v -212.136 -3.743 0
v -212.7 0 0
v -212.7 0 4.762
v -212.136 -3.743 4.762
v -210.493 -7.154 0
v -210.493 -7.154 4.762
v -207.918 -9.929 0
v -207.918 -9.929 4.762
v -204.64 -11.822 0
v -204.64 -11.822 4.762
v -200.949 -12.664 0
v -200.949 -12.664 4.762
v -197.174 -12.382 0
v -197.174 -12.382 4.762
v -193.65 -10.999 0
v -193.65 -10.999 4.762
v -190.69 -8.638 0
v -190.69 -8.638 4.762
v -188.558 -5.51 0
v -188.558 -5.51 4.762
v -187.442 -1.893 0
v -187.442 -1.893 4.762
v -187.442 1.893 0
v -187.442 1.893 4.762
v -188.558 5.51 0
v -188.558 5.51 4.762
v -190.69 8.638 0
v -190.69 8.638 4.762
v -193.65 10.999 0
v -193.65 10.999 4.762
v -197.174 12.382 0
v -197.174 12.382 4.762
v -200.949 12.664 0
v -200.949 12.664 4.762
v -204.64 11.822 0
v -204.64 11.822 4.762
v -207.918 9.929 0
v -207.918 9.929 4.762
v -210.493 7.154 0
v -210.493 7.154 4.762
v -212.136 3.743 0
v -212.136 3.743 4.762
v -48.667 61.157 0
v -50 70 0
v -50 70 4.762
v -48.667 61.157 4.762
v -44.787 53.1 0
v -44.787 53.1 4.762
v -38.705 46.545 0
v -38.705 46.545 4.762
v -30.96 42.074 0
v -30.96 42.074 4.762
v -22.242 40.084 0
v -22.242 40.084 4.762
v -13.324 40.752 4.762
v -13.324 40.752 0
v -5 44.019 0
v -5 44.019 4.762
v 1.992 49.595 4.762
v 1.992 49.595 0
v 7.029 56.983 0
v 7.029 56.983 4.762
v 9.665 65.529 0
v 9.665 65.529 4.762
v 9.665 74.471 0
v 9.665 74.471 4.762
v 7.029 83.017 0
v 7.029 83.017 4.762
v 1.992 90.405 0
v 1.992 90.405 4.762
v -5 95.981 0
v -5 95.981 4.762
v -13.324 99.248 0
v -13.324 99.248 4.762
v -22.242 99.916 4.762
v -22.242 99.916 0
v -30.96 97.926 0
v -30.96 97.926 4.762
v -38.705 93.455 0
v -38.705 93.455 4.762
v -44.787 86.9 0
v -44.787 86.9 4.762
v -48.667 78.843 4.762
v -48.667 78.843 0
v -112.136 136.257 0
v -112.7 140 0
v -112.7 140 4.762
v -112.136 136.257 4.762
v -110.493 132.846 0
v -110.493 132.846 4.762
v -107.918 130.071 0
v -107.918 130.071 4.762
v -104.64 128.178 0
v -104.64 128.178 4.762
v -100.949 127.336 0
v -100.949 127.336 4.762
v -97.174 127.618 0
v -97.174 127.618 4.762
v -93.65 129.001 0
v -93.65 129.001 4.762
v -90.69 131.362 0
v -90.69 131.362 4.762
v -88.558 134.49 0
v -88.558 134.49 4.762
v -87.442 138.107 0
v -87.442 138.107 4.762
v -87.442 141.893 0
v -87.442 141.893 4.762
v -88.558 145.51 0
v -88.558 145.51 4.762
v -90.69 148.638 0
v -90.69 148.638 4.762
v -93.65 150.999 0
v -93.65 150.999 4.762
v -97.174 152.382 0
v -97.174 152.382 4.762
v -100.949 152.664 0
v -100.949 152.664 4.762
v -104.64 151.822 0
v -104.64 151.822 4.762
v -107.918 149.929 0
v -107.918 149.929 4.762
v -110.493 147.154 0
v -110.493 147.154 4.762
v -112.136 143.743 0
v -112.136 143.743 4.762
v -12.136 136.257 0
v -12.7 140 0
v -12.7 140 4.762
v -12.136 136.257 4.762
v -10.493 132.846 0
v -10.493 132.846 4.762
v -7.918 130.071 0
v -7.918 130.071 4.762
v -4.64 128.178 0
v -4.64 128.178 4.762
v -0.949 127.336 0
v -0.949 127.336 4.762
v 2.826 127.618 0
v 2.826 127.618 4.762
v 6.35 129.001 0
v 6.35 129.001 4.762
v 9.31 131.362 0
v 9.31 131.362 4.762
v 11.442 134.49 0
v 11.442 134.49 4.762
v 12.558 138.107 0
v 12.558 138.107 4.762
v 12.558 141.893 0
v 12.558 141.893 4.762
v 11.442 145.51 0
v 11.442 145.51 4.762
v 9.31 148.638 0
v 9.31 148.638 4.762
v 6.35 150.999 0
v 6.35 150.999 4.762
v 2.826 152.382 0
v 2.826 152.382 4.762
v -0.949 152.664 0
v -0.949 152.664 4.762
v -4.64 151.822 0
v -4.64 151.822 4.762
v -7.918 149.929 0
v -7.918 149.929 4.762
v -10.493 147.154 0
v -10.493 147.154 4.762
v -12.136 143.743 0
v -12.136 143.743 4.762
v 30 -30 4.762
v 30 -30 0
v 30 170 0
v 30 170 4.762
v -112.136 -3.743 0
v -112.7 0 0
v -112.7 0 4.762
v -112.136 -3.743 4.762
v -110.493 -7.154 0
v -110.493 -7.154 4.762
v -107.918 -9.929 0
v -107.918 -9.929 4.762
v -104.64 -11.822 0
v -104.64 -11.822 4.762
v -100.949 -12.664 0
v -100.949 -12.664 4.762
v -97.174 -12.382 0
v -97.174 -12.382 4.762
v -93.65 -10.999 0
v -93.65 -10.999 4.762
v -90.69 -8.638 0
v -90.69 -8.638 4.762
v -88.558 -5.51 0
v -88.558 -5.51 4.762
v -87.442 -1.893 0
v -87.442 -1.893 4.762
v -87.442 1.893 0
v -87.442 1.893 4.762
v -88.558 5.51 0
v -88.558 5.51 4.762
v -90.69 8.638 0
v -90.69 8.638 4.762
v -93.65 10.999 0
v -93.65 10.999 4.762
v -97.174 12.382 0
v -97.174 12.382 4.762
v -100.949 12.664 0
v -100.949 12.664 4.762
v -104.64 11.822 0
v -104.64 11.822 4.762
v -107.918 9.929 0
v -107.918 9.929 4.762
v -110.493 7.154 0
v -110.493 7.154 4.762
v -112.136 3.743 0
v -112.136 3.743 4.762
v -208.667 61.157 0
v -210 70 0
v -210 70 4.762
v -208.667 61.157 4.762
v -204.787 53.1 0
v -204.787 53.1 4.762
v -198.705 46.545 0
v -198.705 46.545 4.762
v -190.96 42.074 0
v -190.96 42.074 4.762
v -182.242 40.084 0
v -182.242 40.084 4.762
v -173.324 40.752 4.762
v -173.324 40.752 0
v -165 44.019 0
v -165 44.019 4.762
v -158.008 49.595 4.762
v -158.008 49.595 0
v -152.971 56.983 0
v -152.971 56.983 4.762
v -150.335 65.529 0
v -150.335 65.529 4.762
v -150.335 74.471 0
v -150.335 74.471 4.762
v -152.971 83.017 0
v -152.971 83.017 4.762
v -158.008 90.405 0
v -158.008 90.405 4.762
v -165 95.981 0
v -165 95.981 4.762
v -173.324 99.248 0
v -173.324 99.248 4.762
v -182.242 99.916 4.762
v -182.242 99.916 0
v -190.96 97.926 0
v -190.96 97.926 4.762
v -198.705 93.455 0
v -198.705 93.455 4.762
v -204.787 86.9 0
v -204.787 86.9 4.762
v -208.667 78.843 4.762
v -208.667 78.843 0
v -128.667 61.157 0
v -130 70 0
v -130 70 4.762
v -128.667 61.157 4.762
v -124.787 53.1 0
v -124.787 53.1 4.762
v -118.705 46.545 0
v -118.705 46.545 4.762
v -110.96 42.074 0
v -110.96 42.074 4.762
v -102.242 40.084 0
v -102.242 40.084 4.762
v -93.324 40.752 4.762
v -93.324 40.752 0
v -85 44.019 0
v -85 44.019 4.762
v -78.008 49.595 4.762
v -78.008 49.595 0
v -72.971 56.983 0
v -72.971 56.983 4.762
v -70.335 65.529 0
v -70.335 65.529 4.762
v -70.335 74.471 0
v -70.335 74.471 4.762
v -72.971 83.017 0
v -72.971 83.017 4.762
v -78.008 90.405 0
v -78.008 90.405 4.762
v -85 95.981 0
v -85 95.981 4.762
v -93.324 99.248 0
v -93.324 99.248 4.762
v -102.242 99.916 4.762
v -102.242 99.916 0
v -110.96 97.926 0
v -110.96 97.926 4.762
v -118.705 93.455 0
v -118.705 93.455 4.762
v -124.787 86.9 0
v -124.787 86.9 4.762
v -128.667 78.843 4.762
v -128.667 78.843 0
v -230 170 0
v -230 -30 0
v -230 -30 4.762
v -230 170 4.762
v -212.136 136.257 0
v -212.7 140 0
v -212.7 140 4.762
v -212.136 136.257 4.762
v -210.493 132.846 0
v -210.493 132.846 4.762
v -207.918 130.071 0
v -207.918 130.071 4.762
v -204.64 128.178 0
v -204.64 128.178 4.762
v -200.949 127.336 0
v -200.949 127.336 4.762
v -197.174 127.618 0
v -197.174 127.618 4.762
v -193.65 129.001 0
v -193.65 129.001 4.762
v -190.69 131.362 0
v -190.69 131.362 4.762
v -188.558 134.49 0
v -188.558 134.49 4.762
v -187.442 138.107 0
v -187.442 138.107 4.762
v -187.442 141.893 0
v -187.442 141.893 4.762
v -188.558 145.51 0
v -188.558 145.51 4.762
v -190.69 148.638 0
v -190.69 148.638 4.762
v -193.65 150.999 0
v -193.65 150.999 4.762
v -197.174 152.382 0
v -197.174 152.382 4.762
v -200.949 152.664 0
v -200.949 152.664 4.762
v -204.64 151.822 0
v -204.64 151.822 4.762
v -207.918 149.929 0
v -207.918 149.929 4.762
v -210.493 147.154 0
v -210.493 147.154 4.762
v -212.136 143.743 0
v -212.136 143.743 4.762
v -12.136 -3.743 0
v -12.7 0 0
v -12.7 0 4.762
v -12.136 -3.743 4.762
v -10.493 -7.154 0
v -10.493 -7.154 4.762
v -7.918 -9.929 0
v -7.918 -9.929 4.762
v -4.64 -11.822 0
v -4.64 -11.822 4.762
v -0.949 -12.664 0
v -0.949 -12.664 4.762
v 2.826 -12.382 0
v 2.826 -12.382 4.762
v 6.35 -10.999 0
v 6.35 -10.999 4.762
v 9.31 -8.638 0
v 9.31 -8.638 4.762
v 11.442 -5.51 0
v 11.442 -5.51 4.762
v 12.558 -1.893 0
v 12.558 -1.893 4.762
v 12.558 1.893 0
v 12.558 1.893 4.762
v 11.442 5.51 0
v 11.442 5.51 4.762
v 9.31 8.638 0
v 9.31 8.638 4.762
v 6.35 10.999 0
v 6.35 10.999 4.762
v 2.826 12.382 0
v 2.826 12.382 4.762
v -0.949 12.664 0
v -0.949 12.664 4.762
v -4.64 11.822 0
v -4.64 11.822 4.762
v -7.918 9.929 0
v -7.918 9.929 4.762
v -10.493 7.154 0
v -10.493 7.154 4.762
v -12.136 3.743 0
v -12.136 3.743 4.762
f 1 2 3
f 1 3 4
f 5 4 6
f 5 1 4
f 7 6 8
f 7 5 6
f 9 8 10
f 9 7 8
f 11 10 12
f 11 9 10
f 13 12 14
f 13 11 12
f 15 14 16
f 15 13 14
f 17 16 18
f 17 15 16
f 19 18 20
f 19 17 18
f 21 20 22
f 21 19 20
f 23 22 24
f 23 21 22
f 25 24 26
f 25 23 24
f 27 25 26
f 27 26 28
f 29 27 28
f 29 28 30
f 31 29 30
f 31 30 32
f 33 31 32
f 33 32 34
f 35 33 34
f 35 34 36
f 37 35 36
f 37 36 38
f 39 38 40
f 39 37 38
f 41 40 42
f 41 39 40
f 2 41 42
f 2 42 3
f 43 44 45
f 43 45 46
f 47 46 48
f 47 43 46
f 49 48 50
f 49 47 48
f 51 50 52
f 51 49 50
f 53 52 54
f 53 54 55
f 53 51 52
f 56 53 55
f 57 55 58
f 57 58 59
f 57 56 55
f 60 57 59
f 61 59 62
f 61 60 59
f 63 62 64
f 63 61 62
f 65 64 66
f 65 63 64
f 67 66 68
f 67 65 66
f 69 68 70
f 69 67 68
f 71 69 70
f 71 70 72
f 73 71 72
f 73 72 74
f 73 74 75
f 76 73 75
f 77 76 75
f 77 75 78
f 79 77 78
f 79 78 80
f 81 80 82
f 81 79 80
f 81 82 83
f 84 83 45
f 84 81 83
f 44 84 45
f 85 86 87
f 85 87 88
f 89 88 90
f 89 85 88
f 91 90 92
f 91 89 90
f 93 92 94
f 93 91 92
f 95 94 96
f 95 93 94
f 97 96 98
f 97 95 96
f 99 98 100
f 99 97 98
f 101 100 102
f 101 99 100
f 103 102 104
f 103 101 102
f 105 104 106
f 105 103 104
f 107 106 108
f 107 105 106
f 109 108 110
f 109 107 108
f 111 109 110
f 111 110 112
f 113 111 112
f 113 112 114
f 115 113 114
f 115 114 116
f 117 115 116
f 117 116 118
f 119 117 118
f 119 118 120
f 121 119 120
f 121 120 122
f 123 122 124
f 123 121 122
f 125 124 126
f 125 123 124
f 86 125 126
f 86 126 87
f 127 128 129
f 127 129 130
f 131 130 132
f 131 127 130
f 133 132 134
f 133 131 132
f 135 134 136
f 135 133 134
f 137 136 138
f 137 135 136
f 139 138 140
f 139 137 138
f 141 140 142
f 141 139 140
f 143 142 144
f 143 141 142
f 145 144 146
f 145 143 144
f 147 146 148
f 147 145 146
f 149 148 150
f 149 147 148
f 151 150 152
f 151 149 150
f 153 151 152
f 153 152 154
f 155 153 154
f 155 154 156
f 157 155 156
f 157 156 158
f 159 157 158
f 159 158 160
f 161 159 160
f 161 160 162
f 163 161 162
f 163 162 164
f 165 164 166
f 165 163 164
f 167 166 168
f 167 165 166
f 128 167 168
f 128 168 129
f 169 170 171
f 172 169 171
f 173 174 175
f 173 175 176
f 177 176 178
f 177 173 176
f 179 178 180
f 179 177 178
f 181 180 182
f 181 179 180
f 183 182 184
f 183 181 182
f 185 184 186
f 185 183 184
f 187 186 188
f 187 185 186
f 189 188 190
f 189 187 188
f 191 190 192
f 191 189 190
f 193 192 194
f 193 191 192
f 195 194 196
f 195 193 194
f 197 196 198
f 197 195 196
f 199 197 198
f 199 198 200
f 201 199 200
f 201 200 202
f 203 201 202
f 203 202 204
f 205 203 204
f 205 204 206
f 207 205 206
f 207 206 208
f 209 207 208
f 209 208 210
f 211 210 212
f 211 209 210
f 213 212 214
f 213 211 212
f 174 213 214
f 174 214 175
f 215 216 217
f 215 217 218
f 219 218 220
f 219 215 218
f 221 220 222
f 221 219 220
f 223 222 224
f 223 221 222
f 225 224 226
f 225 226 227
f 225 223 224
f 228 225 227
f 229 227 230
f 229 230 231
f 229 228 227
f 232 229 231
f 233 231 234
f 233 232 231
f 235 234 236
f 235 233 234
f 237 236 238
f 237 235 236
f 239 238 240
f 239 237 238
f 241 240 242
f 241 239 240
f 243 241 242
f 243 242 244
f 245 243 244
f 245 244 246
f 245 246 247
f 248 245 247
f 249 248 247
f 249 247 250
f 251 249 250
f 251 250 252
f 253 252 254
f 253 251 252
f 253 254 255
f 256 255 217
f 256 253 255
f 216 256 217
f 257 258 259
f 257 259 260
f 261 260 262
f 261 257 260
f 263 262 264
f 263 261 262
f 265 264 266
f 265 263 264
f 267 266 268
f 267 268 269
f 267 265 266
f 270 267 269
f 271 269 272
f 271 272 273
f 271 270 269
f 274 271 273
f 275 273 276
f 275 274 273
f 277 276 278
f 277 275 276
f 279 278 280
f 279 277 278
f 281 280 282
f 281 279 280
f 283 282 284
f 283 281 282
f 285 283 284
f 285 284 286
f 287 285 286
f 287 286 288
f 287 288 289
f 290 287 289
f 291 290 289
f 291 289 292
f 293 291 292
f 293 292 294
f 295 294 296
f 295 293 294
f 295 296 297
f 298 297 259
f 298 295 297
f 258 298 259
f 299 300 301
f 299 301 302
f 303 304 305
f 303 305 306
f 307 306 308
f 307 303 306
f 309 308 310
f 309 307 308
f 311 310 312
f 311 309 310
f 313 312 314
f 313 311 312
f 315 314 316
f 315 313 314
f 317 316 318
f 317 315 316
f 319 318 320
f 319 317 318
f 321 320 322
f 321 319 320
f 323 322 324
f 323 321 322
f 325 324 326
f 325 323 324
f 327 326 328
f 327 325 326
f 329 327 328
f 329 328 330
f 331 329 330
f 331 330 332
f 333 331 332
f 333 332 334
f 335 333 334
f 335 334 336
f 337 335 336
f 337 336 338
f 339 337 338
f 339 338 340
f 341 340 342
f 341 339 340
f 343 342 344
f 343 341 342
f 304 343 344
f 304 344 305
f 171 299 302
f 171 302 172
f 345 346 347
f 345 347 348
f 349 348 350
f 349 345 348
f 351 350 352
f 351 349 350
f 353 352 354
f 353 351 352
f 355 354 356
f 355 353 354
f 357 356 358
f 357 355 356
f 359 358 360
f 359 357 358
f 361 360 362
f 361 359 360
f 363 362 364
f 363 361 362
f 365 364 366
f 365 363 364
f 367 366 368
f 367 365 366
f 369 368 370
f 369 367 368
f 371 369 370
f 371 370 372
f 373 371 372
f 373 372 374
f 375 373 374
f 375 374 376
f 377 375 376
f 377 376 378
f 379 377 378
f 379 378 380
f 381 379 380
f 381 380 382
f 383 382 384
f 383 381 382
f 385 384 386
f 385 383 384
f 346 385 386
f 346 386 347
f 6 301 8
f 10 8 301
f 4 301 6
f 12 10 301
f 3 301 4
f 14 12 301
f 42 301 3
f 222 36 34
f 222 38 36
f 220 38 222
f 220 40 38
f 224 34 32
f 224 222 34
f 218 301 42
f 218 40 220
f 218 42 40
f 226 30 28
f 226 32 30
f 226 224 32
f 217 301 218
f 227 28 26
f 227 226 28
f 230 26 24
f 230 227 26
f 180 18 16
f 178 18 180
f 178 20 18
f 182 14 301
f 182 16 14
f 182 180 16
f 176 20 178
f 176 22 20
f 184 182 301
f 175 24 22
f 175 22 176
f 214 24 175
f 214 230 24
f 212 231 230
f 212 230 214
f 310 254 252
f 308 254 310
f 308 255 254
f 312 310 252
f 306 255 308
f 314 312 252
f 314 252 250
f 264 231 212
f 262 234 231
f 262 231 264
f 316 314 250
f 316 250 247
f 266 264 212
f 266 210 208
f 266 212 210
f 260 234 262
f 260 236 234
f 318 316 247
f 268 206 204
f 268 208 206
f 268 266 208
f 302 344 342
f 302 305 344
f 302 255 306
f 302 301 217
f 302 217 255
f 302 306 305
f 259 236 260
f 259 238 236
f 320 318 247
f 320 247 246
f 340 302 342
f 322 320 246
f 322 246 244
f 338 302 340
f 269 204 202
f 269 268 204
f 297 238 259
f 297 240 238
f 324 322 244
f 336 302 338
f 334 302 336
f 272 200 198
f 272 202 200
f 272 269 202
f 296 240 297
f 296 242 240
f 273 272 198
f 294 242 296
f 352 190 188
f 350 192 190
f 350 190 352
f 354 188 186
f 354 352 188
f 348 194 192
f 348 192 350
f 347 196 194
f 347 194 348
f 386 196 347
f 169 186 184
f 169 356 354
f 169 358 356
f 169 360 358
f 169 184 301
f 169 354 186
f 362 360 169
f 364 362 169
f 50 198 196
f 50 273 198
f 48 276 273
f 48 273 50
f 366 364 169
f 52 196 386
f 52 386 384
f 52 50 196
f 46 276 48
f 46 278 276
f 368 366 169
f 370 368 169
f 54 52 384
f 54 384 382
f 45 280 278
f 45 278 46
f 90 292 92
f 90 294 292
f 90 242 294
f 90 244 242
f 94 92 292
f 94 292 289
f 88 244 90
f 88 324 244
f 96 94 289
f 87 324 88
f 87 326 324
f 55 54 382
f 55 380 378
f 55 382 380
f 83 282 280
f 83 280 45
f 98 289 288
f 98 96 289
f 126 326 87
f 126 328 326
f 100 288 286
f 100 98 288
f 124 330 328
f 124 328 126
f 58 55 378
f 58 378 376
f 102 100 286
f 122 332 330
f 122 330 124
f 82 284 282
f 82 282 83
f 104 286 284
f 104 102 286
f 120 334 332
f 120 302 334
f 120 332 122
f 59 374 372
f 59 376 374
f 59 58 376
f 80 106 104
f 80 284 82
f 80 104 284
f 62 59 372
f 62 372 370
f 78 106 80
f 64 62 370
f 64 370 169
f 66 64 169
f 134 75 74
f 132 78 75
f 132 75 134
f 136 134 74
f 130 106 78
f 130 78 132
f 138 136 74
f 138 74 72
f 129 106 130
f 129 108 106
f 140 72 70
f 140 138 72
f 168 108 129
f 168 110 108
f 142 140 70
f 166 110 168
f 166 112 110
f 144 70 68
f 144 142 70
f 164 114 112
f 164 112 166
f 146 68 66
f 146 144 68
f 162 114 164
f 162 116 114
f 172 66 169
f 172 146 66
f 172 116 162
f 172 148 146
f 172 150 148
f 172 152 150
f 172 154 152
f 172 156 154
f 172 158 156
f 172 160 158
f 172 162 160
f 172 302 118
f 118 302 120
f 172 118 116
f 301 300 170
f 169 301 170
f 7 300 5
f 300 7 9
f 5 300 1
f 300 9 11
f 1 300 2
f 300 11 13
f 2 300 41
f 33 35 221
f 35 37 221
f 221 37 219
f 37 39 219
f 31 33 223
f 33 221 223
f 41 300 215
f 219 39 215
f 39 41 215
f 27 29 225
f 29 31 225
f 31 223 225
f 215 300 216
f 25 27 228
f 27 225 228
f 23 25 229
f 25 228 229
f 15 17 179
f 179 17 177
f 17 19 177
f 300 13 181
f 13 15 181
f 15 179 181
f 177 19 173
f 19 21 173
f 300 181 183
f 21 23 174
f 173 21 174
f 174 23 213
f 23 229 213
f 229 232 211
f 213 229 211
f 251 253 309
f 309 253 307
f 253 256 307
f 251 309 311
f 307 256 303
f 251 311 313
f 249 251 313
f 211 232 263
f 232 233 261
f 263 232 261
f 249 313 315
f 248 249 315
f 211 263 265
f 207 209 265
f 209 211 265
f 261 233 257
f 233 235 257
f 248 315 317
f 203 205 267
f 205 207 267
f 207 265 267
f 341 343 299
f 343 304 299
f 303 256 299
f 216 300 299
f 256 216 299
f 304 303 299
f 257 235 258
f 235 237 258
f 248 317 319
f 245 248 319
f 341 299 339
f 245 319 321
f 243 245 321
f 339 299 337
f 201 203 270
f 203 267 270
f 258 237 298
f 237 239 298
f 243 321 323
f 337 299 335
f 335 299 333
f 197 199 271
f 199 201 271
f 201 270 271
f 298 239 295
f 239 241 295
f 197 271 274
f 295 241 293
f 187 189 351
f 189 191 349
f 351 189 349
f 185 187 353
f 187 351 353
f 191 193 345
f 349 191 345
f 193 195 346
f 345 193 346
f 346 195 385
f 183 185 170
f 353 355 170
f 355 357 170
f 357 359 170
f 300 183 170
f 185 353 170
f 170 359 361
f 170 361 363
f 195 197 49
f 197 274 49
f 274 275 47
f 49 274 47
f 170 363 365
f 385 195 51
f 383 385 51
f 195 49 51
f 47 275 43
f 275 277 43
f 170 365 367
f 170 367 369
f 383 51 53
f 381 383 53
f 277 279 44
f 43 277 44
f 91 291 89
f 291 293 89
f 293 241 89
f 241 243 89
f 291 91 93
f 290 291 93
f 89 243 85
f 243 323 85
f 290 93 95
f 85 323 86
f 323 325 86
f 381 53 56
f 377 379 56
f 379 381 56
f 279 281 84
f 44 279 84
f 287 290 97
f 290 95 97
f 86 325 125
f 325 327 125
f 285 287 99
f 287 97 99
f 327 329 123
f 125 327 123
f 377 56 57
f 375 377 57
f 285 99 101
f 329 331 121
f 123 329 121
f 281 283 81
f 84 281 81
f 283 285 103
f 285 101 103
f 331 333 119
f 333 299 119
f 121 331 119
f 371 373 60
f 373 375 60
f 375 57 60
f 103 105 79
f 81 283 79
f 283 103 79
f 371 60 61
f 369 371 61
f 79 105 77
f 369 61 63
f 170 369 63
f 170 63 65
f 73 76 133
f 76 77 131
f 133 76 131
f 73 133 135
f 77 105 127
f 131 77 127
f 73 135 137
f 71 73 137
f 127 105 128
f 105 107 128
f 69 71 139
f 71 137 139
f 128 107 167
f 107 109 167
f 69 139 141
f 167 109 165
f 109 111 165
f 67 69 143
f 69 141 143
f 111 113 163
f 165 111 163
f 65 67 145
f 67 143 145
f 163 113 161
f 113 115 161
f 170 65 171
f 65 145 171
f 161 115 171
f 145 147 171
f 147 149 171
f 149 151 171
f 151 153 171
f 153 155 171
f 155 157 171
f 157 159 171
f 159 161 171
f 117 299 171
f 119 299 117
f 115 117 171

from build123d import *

# Parameters (mm, degrees)
ESBO_O1_W                = 260
ESBO_O1_H                = 200
ESBO_O1_R                = 12.7
ESBO_O1_R_2              = 30
RESSALTO_EXTRUS_O1_DEPTH = 4.7625


with BuildPart() as part:
    # Esboço1 → Ressalto-extrusão1 (new body)
    with BuildSketch(Plane.XY):
        with Locations((-100, 70)):
            Rectangle(ESBO_O1_W, ESBO_O1_H)
        with Locations(Location((0, 0, 0), (0, 0, 180))):
            Circle(ESBO_O1_R, mode=Mode.SUBTRACT)
        with Locations(Location((-100, 0, 0), (0, 0, 180))):
            Circle(ESBO_O1_R, mode=Mode.SUBTRACT)
        with Locations(Location((-200, 0, 0), (0, 0, 180))):
            Circle(ESBO_O1_R, mode=Mode.SUBTRACT)
        with Locations(Location((-200, 140, 0), (0, 0, 180))):
            Circle(ESBO_O1_R, mode=Mode.SUBTRACT)
        with Locations(Location((-100, 140, 0), (0, 0, 180))):
            Circle(ESBO_O1_R, mode=Mode.SUBTRACT)
        with Locations(Location((0, 140, 0), (0, 0, 180))):
            Circle(ESBO_O1_R, mode=Mode.SUBTRACT)
        with Locations(Location((-100, 70, 0), (0, 0, 180))):
            Circle(ESBO_O1_R_2, mode=Mode.SUBTRACT)
        with Locations(Location((-20, 70, 0), (0, 0, 180))):
            Circle(ESBO_O1_R_2, mode=Mode.SUBTRACT)
        with Locations(Location((-180, 70, 0), (0, 0, 180))):
            Circle(ESBO_O1_R_2, mode=Mode.SUBTRACT)
    extrude(amount=RESSALTO_EXTRUS_O1_DEPTH)


solid = part.part
